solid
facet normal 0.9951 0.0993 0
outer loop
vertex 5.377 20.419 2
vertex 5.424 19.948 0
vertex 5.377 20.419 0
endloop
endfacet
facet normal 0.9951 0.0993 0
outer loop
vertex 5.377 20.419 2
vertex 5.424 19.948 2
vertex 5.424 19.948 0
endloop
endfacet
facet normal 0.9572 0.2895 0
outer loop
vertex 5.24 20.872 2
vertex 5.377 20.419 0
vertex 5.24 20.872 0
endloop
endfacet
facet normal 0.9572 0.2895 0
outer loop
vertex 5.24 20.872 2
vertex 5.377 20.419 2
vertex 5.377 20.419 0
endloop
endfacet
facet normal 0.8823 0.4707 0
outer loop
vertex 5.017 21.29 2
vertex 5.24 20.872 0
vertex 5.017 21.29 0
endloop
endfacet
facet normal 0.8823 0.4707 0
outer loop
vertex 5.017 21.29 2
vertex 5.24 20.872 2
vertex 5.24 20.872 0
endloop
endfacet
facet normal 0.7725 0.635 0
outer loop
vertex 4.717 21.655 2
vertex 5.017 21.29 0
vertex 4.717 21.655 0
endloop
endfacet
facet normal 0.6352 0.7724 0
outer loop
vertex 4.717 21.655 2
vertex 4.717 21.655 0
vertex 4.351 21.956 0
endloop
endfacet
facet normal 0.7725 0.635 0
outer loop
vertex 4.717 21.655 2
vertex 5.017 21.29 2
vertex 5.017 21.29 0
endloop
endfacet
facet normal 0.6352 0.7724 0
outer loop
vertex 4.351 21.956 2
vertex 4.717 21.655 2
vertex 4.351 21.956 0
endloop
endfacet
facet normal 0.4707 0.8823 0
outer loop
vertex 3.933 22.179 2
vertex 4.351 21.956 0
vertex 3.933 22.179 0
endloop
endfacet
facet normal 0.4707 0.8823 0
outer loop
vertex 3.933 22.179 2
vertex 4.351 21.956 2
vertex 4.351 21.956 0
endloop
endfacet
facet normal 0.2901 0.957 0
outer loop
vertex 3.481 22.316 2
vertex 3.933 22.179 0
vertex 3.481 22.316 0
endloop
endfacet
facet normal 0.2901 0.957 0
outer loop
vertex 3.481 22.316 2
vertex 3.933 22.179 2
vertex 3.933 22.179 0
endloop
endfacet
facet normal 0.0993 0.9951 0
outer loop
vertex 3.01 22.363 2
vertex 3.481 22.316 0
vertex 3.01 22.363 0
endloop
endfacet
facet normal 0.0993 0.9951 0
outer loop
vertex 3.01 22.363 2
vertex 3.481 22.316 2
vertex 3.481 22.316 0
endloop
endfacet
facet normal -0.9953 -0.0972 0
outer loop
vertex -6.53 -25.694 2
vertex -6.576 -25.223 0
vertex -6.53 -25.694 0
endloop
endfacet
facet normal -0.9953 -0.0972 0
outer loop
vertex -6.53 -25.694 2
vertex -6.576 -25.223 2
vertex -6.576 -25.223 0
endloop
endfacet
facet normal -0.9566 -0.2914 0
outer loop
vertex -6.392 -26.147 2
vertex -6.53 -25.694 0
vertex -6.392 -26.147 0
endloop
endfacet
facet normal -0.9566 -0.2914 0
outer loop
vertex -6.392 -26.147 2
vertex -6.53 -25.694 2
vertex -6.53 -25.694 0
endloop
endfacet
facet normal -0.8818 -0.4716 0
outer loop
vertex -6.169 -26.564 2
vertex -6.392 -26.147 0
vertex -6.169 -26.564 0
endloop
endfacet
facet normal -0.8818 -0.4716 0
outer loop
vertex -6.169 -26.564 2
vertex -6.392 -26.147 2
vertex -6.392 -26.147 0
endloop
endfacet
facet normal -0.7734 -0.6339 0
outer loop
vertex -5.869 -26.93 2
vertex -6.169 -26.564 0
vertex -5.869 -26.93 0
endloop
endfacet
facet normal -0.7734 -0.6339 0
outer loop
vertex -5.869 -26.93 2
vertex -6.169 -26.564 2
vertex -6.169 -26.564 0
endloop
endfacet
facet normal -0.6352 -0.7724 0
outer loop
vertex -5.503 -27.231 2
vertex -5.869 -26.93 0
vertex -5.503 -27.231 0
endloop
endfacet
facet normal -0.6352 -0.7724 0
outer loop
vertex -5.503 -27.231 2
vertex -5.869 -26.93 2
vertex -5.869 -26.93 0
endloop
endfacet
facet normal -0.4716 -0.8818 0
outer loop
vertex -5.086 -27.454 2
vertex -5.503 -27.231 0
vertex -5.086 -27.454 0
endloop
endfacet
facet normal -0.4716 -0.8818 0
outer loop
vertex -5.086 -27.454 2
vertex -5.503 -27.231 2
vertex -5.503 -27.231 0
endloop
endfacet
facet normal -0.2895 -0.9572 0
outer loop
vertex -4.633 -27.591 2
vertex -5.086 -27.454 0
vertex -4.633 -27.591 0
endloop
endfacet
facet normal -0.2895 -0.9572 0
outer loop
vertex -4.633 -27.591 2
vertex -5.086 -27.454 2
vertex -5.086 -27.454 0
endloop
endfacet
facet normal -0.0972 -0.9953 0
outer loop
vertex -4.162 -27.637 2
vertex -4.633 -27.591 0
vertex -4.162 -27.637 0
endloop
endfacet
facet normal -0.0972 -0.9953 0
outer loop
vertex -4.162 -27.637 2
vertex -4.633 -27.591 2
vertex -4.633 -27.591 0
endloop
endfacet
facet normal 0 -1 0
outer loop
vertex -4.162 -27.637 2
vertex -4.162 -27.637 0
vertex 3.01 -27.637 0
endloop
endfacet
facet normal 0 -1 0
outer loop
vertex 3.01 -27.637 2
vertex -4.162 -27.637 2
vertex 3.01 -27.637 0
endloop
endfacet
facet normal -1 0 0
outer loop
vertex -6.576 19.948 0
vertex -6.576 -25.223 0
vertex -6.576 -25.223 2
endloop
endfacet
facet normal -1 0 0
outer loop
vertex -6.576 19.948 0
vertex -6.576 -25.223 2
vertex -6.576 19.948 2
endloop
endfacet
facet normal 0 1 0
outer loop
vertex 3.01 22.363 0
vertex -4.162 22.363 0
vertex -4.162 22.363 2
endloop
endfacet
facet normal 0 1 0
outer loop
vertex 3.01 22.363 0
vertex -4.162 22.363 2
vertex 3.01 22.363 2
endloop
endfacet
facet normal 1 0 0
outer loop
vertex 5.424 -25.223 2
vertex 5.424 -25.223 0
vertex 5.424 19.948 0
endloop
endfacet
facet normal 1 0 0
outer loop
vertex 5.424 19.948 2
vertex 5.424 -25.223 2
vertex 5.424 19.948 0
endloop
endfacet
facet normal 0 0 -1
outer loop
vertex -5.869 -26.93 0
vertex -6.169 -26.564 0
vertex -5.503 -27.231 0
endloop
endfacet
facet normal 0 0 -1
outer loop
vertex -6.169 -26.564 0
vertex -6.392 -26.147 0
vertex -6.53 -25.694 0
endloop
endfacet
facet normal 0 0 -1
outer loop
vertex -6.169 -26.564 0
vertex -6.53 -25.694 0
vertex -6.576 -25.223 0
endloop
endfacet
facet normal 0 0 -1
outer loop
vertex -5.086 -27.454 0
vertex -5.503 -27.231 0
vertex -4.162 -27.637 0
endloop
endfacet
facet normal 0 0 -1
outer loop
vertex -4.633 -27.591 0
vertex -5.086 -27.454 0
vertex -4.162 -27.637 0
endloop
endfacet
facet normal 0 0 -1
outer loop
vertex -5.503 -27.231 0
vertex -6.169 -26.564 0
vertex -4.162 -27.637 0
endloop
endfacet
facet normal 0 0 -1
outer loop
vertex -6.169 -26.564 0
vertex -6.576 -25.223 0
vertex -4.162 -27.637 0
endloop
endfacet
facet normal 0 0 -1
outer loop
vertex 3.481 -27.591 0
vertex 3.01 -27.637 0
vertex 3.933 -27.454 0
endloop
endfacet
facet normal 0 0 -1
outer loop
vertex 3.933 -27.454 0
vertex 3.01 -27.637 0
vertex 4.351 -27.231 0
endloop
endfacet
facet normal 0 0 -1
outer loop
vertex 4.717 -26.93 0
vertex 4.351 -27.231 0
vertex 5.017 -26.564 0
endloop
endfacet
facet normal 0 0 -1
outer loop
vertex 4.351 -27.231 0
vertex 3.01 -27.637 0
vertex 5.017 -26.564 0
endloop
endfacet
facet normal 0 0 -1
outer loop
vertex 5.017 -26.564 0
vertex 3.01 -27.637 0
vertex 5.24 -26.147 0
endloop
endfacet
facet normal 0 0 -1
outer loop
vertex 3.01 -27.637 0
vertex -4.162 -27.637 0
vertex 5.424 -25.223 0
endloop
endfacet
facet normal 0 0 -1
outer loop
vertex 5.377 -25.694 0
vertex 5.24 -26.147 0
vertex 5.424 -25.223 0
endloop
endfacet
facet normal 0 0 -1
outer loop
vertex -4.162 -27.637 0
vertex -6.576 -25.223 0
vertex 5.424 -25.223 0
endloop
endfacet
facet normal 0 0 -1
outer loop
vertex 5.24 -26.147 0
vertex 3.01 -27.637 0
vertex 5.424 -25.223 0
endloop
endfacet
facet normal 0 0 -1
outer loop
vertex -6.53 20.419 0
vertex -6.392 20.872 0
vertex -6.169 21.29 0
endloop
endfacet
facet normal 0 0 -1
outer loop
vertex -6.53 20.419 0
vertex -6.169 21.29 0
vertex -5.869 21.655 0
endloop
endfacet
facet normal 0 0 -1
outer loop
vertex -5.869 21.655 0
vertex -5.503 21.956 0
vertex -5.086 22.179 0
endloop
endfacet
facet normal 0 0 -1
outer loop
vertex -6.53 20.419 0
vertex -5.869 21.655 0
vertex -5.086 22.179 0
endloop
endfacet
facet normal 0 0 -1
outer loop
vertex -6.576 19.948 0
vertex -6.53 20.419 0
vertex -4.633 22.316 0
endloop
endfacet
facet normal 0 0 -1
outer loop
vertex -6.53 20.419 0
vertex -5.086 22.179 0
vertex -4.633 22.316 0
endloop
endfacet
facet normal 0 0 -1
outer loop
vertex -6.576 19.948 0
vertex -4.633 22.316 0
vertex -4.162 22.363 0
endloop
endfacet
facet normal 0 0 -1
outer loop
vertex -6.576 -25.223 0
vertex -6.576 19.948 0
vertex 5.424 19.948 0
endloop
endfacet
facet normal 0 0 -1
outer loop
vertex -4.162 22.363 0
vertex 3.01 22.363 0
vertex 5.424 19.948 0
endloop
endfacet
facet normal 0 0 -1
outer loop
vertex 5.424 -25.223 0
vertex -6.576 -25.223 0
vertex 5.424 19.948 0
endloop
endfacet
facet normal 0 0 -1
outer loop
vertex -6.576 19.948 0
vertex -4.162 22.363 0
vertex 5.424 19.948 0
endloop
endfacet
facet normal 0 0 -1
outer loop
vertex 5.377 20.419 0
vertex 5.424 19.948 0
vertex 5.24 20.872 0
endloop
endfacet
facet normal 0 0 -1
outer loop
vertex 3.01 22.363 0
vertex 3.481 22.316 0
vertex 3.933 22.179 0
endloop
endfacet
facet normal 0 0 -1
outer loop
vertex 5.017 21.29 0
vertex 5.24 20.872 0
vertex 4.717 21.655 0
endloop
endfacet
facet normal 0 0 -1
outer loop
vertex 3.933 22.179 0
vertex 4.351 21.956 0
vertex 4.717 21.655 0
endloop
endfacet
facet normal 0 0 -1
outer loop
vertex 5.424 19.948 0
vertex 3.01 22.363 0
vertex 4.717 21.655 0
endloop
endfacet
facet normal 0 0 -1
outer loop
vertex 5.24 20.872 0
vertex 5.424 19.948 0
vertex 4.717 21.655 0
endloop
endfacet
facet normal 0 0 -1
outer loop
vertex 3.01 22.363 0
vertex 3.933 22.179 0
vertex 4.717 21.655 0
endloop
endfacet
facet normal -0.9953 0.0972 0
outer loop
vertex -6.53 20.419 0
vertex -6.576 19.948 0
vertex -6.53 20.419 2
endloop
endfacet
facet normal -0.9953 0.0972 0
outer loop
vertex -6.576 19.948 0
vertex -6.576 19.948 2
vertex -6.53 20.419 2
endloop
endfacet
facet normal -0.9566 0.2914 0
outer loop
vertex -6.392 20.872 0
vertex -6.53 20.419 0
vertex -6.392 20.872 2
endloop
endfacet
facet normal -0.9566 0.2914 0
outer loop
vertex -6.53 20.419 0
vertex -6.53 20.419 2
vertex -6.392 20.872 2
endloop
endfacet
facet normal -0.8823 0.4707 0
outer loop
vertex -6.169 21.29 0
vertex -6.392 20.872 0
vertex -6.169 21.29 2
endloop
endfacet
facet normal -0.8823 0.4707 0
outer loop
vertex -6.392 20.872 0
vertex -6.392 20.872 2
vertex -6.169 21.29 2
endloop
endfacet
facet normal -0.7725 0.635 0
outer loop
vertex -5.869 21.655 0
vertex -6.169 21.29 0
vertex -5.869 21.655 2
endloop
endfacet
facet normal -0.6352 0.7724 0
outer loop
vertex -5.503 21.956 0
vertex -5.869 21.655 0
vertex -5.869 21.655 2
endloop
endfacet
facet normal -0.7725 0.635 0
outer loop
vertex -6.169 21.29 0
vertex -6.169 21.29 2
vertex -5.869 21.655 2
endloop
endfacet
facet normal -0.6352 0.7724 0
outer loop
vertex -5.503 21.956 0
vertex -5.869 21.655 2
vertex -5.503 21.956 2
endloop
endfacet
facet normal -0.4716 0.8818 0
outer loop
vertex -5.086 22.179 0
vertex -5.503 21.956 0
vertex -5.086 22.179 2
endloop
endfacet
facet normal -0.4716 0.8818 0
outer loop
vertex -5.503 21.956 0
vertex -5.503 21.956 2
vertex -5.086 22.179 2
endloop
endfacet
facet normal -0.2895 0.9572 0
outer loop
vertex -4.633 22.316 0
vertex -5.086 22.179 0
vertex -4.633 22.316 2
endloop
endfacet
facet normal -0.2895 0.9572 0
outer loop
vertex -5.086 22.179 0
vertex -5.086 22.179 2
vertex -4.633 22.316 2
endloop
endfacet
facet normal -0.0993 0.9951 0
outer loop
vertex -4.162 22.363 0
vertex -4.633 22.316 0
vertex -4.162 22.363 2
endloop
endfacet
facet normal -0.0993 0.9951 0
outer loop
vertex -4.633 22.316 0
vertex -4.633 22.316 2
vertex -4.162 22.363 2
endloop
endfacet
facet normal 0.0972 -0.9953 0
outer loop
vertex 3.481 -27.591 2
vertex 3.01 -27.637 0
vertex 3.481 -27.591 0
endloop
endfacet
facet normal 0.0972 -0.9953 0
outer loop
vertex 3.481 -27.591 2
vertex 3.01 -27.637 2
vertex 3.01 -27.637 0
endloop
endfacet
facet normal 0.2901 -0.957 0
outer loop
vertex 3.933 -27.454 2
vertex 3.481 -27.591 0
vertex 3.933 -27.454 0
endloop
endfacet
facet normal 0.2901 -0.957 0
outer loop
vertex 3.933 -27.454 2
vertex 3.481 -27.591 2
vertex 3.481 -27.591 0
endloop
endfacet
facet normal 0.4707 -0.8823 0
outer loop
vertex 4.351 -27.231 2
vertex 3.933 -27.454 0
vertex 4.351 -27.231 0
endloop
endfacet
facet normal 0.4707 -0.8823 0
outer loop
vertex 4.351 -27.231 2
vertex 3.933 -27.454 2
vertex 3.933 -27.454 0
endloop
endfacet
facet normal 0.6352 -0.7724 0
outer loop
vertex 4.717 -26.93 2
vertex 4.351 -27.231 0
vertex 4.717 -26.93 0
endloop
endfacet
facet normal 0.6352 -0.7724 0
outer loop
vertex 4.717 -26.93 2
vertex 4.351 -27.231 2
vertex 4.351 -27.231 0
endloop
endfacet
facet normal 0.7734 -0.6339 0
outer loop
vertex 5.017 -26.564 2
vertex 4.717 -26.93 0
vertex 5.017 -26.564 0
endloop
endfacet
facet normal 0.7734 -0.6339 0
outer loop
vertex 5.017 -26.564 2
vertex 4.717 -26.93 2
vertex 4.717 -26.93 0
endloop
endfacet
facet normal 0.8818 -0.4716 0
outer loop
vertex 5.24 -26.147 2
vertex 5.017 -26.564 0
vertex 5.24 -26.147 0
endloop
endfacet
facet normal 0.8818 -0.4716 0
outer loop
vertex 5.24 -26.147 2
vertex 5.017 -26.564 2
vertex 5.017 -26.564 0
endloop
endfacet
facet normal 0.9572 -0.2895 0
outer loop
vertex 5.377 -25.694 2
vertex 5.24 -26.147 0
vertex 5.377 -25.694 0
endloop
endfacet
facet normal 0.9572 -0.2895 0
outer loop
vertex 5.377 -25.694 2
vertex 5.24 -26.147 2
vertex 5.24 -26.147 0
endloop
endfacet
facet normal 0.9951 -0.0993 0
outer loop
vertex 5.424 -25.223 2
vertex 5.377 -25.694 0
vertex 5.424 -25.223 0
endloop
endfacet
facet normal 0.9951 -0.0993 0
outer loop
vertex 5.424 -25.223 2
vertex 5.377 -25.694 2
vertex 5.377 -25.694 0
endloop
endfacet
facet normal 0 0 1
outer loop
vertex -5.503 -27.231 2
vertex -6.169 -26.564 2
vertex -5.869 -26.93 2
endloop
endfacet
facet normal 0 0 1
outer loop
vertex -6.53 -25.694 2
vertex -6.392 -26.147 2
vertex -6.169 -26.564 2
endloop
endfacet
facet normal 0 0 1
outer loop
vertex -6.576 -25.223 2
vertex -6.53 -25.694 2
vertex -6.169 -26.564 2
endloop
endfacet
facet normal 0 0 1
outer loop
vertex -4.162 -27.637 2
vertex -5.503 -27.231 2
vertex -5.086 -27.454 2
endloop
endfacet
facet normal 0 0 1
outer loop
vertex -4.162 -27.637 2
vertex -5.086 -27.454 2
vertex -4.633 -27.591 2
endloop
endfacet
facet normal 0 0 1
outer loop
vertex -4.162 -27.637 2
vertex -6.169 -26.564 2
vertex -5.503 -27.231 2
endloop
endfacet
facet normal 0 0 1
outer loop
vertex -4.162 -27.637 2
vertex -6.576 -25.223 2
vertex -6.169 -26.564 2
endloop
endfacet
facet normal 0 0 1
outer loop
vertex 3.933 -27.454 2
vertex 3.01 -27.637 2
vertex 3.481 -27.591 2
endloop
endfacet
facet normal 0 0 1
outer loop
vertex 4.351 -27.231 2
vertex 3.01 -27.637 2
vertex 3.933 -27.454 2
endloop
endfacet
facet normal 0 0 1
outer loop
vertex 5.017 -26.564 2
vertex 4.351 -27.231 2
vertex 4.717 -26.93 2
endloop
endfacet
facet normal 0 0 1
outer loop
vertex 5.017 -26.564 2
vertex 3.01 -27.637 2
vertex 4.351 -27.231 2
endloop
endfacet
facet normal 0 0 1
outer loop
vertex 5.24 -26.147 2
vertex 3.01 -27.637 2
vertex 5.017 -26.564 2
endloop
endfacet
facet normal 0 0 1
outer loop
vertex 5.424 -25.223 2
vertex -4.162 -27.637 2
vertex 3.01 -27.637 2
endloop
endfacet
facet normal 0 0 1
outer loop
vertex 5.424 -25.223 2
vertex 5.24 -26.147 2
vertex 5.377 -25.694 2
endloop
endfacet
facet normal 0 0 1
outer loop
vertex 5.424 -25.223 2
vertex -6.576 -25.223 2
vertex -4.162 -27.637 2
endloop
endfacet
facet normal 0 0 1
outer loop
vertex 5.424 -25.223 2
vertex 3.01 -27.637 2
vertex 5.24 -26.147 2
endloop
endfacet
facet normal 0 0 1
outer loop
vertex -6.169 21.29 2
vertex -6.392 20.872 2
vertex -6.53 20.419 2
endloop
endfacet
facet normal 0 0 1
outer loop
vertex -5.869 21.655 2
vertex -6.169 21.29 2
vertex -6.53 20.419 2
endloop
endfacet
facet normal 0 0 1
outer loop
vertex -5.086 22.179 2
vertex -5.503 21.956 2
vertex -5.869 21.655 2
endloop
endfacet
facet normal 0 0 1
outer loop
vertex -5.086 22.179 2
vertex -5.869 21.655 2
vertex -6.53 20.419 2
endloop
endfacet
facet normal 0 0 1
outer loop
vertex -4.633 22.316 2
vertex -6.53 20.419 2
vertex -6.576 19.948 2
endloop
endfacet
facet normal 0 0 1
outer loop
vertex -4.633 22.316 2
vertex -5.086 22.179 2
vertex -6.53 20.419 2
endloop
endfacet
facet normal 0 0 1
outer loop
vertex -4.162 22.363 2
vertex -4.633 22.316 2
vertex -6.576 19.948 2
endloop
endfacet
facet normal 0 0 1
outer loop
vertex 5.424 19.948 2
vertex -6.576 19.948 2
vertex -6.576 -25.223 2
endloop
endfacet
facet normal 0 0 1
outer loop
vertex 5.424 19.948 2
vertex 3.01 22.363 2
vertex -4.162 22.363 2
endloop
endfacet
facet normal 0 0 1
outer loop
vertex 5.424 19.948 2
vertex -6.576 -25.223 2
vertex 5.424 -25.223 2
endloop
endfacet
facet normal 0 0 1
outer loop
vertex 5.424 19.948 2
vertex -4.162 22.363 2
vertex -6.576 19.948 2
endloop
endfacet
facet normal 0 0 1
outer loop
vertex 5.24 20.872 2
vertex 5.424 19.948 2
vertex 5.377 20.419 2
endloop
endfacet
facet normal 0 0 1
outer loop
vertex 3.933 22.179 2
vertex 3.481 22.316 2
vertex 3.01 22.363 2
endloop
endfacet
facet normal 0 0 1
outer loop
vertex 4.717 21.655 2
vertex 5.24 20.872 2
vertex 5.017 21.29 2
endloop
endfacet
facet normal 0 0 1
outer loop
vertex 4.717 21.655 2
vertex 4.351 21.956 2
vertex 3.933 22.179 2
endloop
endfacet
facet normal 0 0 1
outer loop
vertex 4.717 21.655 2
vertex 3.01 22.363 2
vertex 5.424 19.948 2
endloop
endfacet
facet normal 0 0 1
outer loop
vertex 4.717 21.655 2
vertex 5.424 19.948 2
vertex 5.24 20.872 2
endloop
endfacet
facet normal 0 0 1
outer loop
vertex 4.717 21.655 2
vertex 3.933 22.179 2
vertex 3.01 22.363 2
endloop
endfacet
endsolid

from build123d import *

# Parameters (mm, degrees)
F0_W     = 12
F0_H     = 50
F1_DEPTH = 2
F2_R     = 2.414214


with BuildPart() as f1:
    # F0 (on Top) → F1 (new body)
    with BuildSketch(Plane.XY):
        with Locations((-0.576223, -2.637421)):
            Rectangle(F0_W, F0_H)
    extrude(amount=F1_DEPTH)

    # F2
    f2_edges = [f1.edges().sort_by_distance(p)[0] for p in [
        (-6.576223, -27.637421, 1),
        (5.423777, -27.637421, 1),
        (5.423777, 22.362579, 1),
        (-6.576223, 22.362579, 1),
    ]]
    fillet(f2_edges, radius=F2_R)


solid = f1.part
